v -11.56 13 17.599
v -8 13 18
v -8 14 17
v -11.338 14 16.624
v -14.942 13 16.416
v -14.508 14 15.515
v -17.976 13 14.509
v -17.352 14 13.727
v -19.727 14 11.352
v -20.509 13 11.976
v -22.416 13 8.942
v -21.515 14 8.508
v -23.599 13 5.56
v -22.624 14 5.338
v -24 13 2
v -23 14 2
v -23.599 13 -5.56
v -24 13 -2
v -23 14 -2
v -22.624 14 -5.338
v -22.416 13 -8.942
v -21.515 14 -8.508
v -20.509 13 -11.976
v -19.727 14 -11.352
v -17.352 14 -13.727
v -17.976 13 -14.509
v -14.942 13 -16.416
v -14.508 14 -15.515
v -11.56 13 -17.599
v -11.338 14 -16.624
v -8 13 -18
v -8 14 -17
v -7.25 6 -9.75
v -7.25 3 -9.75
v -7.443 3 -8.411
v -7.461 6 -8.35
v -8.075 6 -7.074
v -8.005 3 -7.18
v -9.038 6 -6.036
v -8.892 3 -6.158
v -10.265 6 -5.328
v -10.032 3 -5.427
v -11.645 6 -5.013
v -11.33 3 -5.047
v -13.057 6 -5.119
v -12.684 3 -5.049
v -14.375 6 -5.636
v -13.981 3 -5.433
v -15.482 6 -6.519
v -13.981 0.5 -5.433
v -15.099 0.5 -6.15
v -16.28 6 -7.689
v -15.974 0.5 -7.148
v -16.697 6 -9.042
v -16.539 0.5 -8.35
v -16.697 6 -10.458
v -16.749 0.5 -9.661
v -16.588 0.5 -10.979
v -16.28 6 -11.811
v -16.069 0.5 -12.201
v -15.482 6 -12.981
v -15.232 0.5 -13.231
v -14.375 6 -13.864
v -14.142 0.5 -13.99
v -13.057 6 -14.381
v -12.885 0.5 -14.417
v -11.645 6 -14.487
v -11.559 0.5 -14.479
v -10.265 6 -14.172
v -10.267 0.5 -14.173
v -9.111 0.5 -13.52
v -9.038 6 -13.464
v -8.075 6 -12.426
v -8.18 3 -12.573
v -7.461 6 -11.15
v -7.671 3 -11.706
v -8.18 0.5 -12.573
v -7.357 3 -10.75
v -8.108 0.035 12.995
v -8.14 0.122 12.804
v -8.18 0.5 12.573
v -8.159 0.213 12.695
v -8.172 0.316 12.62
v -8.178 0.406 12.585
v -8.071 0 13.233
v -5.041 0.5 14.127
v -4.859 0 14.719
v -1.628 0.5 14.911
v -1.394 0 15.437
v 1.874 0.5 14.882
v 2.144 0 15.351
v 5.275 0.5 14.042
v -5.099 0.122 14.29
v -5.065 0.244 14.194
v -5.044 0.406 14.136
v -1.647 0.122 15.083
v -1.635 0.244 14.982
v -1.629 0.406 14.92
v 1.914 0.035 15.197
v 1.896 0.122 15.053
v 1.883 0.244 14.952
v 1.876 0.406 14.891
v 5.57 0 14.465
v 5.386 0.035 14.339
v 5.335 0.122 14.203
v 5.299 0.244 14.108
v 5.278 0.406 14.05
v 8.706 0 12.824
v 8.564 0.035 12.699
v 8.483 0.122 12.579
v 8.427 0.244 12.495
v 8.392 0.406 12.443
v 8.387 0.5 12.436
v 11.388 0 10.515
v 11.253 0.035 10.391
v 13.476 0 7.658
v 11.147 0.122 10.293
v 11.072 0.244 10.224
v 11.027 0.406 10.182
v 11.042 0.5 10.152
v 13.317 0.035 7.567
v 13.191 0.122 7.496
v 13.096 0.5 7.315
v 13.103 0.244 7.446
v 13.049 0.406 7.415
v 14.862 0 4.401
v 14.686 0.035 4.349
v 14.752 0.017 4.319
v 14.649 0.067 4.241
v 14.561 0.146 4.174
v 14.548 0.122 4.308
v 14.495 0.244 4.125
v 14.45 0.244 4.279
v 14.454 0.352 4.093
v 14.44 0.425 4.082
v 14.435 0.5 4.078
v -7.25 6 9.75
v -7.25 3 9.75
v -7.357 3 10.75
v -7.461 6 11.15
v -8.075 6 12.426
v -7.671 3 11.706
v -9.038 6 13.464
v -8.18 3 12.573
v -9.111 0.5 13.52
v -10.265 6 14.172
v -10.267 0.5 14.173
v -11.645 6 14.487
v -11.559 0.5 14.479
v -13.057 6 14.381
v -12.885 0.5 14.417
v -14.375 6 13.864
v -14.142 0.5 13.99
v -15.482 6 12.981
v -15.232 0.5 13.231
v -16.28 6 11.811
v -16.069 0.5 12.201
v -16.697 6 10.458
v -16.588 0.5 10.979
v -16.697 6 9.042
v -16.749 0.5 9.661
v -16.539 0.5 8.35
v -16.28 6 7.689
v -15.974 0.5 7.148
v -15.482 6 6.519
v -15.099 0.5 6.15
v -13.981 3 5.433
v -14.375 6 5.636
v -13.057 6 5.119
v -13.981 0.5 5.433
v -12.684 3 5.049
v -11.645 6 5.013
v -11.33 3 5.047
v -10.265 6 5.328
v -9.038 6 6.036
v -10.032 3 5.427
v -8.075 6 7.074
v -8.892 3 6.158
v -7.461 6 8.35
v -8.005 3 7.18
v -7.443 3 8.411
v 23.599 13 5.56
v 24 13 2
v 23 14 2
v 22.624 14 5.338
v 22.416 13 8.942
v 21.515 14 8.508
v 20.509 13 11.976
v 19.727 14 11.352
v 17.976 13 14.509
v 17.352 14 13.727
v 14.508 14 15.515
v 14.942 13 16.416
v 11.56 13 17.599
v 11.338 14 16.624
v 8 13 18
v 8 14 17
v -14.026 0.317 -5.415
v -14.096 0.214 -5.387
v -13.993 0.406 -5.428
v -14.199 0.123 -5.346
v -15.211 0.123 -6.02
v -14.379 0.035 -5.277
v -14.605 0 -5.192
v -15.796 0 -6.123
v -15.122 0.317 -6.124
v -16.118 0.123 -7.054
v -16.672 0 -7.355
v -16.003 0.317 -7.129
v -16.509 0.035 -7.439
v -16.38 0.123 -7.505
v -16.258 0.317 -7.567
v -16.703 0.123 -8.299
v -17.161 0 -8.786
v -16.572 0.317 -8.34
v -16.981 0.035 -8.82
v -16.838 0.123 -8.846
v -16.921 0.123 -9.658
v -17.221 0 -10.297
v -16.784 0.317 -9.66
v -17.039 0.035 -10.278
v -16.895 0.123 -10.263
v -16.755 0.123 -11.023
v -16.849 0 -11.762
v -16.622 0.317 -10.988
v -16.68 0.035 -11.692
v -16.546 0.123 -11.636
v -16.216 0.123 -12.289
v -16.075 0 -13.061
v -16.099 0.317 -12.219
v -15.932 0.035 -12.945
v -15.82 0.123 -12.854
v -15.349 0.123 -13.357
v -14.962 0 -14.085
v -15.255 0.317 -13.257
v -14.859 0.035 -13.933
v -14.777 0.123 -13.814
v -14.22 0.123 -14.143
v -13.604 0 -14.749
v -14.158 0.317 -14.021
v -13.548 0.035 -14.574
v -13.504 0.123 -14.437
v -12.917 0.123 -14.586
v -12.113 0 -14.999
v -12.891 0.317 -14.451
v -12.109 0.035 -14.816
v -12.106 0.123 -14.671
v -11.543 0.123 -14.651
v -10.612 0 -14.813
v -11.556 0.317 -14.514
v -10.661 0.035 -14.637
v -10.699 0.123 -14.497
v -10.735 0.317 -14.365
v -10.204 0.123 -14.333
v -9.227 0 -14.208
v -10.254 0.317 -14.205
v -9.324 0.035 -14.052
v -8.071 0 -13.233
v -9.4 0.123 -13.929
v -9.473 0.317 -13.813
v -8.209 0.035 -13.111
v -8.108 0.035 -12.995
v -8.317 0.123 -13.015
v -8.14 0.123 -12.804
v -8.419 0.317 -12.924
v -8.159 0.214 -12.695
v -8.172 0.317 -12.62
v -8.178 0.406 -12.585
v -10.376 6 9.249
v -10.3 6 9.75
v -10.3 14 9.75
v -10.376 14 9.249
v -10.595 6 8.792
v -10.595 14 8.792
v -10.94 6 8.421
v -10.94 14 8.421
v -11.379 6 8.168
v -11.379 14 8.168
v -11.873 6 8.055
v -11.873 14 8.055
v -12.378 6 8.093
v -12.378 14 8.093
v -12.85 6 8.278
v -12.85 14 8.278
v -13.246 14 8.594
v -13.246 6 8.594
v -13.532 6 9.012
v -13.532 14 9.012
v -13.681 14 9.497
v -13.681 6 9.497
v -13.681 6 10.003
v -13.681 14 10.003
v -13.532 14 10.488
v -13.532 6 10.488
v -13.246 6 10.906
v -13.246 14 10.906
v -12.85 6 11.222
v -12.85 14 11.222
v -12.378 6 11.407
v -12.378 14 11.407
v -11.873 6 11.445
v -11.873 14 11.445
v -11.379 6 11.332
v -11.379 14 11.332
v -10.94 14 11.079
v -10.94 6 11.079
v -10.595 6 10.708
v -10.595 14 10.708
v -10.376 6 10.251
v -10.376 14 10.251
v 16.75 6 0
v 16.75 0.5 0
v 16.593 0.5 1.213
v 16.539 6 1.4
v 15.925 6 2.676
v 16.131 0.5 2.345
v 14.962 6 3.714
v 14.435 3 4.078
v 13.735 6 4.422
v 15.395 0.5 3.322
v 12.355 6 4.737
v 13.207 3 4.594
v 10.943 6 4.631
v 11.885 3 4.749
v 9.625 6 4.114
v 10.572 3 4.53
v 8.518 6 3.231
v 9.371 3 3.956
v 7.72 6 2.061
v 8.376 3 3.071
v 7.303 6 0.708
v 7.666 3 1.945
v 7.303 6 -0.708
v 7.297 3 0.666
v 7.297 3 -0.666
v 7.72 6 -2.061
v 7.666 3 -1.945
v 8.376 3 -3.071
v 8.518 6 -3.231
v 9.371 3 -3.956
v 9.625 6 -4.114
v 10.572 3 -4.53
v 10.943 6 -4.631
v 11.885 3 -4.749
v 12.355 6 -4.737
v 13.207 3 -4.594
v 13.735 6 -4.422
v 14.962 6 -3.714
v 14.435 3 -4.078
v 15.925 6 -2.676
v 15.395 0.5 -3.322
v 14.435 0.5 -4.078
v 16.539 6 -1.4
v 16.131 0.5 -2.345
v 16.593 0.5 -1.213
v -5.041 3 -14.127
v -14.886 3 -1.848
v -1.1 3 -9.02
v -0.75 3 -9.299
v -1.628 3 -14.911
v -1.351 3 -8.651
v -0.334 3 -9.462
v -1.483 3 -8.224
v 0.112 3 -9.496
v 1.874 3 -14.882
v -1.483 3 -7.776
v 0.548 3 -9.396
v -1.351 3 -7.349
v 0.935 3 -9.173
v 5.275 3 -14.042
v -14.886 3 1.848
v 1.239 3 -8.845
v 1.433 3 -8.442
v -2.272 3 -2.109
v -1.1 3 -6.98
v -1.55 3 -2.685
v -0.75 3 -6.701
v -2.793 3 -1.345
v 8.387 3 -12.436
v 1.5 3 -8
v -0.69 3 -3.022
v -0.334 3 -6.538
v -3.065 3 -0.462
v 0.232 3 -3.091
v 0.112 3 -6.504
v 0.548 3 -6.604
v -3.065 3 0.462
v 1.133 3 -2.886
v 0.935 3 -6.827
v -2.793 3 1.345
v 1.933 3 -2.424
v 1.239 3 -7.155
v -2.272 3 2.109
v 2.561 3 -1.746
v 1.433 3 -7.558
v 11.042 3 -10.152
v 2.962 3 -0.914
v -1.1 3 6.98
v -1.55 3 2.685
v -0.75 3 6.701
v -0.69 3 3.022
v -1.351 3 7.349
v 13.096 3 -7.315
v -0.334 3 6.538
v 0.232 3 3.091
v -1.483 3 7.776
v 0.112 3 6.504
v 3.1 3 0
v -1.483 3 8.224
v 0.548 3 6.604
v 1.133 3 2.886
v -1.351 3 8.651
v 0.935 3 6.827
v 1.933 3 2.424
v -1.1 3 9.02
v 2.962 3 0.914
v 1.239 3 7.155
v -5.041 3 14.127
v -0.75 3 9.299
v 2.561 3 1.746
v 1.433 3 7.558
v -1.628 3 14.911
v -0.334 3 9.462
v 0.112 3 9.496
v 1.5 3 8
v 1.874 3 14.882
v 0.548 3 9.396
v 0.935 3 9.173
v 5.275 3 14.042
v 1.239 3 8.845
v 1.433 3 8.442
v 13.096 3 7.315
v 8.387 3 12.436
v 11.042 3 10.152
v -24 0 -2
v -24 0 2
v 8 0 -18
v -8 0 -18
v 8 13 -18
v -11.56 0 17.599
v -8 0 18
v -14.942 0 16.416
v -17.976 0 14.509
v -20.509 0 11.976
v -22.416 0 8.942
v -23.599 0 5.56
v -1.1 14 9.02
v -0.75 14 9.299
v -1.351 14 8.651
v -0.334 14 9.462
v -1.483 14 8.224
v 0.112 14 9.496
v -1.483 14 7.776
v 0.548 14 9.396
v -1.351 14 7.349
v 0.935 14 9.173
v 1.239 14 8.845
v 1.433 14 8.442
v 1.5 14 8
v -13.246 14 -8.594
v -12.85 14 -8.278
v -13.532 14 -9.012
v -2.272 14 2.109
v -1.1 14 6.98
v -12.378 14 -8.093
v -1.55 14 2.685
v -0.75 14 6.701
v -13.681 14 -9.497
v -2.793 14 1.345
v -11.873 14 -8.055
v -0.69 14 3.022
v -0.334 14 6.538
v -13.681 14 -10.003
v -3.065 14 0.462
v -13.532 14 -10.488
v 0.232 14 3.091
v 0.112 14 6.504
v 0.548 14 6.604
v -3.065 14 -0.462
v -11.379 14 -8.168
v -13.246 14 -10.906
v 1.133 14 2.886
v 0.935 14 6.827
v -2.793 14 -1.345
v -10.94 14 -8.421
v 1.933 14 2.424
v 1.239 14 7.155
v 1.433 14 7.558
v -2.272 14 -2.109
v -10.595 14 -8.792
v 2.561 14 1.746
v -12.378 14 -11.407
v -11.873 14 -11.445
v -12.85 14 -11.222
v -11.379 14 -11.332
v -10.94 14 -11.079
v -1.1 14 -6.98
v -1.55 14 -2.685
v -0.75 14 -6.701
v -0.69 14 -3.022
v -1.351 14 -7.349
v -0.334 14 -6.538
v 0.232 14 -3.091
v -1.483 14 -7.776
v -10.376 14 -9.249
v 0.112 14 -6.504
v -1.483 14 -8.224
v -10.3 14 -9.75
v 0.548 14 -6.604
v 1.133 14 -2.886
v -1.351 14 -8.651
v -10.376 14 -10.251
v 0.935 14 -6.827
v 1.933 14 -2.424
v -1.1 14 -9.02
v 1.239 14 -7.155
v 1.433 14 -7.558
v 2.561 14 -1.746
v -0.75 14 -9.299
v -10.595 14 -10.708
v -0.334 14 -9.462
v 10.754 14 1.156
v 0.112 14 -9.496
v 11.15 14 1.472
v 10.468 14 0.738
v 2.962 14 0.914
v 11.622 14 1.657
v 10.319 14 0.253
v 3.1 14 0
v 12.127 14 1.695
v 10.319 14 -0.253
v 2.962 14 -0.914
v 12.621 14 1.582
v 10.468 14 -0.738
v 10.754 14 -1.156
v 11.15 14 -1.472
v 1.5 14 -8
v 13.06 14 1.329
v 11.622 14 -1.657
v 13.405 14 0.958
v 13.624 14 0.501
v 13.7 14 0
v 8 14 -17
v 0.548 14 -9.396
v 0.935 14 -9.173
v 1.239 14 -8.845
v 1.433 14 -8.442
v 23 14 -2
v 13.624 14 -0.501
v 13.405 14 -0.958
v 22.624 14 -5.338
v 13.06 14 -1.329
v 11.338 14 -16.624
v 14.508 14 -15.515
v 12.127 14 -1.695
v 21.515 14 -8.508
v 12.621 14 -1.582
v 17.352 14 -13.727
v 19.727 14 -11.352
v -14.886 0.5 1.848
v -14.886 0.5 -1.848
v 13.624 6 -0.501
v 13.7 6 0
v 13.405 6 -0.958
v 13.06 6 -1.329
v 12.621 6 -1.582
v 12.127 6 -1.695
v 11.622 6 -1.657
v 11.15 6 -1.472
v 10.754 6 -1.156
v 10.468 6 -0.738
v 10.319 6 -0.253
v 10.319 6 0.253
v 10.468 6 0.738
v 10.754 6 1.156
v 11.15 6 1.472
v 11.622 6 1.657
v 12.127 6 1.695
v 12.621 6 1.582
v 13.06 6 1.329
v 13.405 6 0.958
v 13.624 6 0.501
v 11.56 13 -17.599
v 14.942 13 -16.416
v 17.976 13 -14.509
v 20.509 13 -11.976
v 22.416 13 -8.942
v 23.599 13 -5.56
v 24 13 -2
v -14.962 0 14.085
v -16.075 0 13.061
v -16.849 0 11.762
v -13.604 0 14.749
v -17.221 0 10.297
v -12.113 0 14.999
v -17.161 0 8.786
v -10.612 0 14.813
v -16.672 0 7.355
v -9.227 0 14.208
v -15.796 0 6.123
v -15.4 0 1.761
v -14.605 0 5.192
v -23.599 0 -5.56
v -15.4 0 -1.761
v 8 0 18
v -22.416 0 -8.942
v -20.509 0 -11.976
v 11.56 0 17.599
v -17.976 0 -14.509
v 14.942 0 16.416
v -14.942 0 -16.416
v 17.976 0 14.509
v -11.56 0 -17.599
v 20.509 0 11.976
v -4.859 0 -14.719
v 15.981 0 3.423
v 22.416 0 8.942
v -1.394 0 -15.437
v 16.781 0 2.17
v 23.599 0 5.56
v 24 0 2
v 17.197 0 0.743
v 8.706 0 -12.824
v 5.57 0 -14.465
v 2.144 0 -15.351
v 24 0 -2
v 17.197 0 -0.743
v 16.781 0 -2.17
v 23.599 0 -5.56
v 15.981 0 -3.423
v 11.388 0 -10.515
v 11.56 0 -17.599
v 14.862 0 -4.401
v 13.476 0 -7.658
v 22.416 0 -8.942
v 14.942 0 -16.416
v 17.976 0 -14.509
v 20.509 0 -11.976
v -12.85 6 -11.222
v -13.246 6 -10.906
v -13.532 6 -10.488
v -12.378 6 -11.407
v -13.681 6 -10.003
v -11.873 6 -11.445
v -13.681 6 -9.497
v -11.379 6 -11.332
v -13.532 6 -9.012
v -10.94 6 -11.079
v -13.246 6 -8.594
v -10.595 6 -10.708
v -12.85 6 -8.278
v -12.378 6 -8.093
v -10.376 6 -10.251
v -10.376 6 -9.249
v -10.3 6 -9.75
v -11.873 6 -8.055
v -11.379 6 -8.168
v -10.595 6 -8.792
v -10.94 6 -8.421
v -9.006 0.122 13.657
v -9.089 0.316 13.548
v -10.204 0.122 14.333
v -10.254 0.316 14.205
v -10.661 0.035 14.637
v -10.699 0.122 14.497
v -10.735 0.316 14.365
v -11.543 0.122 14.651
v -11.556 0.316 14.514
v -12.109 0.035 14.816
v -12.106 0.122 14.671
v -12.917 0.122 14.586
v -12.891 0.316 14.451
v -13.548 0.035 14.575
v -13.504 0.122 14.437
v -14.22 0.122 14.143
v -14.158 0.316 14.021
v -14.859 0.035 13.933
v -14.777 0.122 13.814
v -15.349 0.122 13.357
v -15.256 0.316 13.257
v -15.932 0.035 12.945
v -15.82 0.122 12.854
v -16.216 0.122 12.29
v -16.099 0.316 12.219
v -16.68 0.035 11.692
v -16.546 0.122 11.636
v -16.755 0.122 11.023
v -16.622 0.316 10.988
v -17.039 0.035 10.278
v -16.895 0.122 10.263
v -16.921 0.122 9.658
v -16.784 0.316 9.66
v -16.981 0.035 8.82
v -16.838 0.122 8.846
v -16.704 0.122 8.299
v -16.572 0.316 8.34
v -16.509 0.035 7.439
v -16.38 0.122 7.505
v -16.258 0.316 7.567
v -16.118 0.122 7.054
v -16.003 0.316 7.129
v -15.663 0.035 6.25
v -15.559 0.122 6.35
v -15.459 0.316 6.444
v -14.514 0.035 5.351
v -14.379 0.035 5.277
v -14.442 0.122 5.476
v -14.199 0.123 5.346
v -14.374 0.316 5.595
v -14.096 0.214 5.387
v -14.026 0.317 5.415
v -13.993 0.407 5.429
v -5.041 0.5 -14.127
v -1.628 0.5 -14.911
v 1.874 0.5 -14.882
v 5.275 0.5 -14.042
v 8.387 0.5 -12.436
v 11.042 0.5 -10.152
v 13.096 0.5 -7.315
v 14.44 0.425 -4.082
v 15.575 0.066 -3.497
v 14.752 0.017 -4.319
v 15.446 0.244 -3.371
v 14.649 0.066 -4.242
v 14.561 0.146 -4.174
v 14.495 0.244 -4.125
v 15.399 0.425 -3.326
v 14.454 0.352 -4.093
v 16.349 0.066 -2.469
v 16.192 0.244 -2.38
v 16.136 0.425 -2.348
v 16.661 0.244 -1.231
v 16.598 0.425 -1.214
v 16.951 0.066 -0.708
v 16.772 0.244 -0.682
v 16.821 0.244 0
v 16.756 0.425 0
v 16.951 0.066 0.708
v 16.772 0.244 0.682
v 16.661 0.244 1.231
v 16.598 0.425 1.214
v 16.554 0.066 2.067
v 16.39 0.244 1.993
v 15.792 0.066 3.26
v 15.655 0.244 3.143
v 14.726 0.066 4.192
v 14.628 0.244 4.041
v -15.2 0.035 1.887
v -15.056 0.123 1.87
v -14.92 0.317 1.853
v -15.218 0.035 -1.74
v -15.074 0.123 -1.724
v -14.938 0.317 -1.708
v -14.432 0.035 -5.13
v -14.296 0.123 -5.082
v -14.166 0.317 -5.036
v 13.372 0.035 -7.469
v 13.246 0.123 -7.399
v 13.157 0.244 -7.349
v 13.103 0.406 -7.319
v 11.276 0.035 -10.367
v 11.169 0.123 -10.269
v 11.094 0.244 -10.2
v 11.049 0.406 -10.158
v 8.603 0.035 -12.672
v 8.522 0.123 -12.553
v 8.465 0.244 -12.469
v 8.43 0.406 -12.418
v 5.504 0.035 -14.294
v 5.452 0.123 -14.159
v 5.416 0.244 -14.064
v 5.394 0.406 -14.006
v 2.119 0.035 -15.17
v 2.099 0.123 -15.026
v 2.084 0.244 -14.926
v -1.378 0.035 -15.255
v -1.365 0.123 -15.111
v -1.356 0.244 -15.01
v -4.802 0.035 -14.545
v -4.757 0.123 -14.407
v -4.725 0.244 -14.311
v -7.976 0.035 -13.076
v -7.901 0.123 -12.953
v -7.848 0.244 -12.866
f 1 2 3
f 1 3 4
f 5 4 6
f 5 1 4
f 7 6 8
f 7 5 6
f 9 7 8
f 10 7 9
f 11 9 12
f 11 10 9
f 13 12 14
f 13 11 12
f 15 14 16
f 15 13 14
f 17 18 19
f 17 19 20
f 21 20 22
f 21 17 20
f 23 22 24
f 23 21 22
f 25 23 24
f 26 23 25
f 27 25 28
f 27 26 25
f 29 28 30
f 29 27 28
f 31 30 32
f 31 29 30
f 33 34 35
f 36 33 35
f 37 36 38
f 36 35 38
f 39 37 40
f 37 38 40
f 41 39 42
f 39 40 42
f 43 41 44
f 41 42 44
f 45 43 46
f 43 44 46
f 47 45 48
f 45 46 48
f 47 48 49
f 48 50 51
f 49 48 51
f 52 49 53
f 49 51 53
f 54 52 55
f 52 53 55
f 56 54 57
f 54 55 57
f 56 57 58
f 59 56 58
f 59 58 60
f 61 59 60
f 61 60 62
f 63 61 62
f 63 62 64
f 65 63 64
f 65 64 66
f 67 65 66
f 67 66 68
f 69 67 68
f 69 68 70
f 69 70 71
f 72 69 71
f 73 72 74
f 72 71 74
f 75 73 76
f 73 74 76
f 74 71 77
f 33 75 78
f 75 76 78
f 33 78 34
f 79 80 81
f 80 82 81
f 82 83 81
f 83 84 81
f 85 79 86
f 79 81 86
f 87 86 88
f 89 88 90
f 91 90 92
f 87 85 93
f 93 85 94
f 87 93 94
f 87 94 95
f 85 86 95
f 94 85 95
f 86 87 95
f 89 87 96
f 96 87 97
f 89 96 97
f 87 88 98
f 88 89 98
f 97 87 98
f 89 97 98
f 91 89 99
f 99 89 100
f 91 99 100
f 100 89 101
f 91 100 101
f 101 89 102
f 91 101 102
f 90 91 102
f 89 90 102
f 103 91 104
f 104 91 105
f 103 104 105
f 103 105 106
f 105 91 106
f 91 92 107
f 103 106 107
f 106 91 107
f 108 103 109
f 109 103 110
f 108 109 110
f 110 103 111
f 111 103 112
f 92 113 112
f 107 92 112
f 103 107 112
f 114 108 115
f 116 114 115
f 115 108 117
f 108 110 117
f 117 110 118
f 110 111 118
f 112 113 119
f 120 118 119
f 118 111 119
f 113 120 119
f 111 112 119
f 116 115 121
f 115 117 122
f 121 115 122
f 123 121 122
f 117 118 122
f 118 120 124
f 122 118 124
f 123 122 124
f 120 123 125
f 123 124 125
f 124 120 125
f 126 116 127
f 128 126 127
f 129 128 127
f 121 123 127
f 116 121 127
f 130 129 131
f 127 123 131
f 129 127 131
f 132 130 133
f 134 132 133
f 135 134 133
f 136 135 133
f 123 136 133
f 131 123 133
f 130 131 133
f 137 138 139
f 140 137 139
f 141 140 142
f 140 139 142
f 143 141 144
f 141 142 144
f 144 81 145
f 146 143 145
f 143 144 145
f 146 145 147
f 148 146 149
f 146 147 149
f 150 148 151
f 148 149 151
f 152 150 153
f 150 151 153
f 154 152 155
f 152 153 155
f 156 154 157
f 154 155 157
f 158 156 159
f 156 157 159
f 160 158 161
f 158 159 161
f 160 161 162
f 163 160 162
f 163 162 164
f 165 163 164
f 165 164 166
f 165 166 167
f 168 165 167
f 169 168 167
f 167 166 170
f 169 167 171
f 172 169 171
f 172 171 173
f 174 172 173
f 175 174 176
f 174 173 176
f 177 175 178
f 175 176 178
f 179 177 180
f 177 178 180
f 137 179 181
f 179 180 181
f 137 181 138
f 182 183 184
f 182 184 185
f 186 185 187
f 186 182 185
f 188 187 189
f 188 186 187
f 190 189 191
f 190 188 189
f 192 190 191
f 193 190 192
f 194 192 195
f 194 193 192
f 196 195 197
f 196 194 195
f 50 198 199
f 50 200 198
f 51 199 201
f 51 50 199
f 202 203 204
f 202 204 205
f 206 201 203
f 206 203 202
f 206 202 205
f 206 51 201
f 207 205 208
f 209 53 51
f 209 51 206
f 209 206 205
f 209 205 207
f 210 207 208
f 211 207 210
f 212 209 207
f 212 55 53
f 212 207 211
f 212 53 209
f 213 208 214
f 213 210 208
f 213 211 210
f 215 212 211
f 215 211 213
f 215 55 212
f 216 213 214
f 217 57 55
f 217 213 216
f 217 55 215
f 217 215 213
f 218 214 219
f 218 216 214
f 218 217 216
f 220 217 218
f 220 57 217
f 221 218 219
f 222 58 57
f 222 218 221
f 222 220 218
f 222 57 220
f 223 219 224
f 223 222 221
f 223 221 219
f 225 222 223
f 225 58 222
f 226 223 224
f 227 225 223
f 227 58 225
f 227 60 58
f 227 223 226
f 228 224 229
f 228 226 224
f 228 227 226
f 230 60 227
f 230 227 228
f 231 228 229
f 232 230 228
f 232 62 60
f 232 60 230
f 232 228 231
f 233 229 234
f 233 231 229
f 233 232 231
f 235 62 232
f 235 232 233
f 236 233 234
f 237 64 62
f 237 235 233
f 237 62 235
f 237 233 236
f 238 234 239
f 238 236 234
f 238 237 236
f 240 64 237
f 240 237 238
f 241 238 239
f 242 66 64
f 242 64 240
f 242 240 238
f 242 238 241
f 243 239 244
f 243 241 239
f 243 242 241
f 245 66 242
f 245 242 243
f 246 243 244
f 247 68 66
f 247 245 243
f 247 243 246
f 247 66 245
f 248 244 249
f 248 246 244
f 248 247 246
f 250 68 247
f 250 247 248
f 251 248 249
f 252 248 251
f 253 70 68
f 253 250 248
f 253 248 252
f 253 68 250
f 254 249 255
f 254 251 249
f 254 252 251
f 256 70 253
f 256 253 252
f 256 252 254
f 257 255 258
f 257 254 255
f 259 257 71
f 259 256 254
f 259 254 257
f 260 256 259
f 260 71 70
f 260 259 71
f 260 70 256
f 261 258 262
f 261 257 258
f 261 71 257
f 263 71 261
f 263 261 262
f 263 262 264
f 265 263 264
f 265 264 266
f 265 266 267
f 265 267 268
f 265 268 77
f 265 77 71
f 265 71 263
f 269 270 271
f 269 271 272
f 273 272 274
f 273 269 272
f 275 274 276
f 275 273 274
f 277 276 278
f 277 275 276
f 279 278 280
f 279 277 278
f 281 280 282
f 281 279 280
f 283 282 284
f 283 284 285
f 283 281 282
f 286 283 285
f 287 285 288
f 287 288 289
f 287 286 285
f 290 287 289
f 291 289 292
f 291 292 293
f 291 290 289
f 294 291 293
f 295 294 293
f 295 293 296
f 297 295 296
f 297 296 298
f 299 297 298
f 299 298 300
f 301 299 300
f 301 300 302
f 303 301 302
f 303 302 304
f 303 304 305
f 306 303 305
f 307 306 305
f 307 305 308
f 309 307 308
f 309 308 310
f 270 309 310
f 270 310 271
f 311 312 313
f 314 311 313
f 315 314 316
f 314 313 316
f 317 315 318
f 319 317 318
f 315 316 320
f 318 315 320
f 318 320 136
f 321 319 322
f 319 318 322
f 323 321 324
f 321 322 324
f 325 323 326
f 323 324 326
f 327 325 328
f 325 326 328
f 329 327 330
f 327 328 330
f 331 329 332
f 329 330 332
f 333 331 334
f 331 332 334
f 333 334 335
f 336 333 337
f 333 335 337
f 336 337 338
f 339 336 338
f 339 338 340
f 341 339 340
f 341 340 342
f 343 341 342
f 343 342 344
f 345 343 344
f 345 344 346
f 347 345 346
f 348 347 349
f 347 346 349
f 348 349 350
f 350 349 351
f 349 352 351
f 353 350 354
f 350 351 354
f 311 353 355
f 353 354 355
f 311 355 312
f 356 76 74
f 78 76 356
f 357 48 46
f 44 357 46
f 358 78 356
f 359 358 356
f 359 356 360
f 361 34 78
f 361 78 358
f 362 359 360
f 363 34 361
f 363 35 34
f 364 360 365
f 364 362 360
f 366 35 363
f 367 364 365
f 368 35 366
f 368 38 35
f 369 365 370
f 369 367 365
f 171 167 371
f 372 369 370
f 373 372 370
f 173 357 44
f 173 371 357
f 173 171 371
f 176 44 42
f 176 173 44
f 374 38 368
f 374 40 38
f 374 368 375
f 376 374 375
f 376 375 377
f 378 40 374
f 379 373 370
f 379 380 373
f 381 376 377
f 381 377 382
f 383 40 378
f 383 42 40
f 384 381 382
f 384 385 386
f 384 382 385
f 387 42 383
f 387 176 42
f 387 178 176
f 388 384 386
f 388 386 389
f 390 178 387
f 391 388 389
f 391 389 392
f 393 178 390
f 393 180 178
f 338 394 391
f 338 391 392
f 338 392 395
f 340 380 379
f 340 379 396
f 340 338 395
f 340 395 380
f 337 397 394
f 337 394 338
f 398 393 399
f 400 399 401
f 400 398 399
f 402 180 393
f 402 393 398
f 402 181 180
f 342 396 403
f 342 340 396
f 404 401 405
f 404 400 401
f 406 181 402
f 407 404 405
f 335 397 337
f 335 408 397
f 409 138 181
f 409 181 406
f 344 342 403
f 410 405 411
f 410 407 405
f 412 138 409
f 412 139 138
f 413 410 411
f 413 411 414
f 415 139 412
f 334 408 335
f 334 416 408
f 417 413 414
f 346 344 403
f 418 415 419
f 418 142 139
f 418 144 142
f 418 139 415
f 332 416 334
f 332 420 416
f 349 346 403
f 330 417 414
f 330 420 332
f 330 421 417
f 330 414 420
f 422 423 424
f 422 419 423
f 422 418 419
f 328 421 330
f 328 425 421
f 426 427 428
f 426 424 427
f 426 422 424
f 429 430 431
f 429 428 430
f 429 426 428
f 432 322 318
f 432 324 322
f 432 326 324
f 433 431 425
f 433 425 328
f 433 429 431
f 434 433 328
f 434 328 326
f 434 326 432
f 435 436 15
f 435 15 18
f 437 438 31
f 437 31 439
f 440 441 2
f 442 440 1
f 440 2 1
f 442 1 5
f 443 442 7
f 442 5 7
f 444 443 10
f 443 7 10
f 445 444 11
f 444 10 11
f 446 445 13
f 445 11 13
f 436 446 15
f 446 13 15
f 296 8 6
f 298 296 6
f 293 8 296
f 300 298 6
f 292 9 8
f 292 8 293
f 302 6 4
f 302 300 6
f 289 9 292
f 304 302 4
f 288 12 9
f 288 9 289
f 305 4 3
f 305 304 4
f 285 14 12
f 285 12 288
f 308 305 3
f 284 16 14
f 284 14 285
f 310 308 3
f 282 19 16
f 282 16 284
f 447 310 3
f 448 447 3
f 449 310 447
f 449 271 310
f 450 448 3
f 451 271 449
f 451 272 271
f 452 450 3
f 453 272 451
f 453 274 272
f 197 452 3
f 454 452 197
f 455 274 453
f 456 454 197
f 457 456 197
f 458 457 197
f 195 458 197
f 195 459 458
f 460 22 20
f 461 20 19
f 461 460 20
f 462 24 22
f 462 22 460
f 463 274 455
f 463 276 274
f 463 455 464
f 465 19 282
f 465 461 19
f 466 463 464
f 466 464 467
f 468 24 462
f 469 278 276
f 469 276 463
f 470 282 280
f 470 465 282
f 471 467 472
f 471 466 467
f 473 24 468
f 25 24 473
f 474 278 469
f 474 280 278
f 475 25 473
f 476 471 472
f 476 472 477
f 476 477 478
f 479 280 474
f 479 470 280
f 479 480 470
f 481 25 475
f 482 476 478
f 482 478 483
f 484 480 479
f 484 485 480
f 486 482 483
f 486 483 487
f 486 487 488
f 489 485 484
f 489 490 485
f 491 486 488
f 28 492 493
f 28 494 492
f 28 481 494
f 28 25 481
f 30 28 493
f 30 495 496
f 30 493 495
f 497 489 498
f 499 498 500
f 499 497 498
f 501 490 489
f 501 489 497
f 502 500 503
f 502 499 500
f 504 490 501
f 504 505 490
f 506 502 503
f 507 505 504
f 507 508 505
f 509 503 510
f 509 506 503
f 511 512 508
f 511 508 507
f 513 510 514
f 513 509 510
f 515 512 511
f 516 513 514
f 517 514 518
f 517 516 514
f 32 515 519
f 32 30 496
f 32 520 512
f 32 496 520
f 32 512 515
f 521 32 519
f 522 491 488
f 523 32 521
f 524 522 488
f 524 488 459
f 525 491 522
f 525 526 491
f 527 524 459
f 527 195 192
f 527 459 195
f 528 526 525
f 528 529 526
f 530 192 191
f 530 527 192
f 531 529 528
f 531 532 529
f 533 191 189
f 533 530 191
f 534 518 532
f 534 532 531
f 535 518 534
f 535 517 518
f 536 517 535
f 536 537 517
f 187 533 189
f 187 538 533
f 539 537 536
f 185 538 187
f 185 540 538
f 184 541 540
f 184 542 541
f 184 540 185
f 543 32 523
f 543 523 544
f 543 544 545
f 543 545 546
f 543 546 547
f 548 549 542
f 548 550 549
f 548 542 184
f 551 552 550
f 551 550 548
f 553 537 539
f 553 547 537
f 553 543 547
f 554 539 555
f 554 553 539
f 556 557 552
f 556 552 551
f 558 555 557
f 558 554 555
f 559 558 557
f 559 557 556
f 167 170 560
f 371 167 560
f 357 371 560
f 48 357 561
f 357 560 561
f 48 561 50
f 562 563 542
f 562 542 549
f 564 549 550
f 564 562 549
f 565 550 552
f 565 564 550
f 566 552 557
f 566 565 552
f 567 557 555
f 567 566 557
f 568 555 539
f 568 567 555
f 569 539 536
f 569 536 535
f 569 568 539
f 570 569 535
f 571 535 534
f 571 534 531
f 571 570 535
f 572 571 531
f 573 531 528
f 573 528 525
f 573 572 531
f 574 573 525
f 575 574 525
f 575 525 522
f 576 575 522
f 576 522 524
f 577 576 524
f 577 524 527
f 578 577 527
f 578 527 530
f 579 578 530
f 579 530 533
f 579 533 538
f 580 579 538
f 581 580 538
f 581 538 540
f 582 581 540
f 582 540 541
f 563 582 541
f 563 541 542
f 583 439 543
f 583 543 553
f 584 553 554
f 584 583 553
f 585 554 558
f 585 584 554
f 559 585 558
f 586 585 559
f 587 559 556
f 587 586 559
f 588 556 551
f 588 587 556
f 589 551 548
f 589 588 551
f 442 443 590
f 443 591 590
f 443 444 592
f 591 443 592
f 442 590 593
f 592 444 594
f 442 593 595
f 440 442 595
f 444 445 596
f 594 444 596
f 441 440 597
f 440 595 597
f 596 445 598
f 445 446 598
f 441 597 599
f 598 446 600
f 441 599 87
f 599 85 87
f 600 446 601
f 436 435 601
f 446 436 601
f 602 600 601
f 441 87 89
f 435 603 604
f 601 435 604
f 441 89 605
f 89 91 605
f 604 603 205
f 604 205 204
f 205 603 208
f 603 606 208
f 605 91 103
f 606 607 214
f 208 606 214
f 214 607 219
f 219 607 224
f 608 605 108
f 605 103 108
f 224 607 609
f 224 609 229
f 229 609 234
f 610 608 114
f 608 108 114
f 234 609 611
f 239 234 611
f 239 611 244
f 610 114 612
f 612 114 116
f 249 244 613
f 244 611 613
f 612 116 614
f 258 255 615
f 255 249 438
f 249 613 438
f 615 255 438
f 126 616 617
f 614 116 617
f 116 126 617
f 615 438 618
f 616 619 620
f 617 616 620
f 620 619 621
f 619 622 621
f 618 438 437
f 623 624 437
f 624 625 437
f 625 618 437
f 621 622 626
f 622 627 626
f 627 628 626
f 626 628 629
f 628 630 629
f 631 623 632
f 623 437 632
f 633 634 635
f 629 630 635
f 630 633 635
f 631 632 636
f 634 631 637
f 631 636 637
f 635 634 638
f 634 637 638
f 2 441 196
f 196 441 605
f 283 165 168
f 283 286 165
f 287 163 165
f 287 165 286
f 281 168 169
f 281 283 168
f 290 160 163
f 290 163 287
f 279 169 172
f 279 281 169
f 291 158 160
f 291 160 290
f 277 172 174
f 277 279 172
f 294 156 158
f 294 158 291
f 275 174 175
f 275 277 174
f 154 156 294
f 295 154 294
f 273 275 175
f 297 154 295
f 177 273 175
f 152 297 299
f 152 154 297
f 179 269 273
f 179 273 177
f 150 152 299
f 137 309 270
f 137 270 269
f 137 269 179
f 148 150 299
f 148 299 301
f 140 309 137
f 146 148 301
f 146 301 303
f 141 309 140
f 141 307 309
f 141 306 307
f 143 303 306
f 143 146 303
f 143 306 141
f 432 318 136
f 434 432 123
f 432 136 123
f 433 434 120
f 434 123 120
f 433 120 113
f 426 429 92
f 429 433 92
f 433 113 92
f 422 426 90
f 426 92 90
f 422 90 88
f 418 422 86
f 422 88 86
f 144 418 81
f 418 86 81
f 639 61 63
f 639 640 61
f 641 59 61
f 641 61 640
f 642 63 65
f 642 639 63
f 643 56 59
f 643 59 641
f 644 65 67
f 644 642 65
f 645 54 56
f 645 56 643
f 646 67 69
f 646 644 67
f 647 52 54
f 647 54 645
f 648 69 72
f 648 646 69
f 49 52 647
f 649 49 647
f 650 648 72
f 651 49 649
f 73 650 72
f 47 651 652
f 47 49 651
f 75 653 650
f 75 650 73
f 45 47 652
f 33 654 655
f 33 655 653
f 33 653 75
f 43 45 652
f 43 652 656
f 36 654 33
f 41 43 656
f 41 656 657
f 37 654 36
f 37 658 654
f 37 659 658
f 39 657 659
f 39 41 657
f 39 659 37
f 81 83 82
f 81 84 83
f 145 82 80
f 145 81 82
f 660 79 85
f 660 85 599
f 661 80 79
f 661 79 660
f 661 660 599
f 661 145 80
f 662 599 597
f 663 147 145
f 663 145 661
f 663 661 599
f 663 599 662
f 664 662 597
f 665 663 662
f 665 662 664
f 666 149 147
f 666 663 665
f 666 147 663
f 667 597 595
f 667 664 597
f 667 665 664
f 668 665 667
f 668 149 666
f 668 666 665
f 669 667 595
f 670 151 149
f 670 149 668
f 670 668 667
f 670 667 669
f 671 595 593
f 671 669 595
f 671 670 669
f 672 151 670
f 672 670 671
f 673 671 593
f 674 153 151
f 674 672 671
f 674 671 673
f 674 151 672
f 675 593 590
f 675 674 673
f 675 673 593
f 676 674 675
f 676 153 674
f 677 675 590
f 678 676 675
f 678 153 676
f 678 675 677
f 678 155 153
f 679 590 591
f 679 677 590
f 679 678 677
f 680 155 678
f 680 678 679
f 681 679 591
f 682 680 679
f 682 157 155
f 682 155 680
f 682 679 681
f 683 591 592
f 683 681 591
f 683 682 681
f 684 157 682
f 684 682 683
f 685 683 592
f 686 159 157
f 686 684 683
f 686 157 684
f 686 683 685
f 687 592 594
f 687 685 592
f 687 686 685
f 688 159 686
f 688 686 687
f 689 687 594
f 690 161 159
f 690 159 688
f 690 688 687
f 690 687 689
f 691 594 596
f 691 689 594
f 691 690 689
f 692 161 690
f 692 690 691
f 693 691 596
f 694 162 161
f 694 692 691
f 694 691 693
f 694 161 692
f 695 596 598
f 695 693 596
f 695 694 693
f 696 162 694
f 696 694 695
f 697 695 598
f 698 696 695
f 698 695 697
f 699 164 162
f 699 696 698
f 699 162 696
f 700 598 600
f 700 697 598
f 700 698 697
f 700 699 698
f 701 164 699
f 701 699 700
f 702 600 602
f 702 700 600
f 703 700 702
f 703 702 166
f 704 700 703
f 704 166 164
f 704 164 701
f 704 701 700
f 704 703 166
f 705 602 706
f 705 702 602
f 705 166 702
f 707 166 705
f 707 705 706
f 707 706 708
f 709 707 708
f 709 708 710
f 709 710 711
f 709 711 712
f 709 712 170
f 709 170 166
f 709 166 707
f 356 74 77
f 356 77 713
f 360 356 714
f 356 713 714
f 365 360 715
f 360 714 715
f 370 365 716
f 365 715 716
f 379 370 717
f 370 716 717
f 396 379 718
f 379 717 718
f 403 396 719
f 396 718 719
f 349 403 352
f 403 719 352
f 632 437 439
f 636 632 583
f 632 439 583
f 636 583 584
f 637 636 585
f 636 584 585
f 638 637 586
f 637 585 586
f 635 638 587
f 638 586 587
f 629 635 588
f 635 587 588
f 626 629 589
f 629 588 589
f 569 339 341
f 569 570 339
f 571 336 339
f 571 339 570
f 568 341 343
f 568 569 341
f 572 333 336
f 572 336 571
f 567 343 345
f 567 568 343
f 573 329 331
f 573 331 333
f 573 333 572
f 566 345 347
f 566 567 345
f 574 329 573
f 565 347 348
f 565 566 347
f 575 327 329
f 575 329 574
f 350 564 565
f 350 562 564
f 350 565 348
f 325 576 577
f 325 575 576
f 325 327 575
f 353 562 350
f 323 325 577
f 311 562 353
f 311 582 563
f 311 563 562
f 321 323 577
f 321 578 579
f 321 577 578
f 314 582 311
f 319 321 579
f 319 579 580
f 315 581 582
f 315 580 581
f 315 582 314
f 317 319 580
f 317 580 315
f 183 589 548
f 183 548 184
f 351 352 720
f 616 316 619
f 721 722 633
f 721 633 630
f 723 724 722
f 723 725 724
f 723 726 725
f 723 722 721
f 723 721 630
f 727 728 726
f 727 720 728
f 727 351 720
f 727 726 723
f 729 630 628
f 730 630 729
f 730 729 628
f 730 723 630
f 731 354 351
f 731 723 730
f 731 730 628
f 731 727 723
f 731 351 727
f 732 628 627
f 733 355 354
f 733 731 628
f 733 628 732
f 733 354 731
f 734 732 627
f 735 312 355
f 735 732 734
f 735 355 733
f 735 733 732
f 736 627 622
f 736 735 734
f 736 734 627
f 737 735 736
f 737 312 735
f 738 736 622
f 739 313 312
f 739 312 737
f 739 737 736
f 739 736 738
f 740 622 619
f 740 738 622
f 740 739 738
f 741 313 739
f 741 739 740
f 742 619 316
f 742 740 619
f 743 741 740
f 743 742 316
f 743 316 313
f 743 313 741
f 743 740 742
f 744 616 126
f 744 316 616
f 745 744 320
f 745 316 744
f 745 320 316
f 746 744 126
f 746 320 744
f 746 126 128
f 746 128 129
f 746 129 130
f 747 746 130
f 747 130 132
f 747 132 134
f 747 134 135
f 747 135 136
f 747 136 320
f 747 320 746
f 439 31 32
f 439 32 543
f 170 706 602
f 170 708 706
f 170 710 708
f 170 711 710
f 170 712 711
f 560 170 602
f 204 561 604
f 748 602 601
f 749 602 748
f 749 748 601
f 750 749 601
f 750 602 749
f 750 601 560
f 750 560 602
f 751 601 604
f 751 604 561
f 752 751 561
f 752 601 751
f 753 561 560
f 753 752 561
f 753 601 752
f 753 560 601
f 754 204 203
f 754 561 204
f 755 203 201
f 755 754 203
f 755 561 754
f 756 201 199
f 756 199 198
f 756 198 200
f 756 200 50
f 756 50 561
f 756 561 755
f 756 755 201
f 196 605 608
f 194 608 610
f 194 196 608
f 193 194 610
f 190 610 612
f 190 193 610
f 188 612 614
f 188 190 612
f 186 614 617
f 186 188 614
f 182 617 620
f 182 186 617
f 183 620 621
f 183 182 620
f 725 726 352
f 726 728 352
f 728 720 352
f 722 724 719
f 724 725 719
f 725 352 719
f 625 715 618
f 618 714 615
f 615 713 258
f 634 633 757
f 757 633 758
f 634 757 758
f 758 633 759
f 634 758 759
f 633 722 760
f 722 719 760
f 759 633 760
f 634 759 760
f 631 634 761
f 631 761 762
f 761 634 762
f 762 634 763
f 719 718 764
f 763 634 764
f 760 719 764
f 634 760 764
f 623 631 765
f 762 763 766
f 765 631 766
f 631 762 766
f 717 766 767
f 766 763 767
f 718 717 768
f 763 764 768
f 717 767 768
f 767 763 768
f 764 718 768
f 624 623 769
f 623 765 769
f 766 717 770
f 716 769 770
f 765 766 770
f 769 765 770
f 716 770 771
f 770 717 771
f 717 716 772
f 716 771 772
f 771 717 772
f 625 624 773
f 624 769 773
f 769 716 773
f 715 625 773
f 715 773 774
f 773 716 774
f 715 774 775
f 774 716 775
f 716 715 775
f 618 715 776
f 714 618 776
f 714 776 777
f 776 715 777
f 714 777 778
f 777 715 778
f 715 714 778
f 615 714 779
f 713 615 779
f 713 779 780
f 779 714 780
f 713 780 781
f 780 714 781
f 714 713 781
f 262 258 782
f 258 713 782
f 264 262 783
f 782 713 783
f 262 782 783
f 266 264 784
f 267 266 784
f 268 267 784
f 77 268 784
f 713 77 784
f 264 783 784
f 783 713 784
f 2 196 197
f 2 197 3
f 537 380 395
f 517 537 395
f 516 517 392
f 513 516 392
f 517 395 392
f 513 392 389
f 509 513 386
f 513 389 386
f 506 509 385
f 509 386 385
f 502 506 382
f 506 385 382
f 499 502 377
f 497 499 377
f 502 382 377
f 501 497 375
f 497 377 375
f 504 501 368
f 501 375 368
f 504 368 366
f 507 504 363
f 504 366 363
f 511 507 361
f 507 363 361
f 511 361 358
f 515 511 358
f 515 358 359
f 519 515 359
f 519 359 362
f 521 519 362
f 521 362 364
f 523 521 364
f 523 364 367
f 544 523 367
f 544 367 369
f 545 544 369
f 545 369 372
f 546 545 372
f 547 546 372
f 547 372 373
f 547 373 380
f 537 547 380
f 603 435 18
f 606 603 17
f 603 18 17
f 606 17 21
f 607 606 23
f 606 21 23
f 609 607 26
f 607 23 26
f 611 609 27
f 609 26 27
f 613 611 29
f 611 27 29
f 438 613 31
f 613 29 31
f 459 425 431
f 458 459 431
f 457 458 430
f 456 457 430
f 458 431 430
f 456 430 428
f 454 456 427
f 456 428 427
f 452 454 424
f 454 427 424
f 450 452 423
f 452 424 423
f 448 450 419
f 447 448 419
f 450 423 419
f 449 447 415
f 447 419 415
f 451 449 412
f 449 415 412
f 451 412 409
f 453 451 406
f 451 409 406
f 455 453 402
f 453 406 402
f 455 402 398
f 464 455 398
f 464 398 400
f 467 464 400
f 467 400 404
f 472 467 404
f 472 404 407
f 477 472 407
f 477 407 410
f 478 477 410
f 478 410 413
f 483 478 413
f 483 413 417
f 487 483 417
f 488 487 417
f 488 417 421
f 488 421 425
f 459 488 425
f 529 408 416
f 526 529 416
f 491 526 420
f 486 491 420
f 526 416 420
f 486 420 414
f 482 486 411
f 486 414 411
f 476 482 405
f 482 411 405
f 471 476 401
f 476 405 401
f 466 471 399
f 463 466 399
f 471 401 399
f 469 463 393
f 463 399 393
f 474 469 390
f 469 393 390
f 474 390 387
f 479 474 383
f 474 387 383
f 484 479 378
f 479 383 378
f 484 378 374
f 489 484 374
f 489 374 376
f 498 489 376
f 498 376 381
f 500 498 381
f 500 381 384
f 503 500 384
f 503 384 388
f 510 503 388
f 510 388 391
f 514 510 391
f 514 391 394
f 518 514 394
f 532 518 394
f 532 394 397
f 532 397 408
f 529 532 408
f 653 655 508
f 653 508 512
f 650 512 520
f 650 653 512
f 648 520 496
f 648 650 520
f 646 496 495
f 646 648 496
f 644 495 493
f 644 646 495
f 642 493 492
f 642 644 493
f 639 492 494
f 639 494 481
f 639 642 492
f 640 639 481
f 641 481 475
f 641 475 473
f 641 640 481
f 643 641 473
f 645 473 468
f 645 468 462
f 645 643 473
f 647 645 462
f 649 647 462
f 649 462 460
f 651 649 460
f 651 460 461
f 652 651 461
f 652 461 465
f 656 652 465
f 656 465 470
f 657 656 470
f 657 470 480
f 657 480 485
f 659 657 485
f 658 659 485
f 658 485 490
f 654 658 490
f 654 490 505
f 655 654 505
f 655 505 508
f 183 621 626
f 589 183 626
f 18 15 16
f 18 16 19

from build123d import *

# Parameters (mm, degrees)
SKETCH1_W           = 48
SKETCH1_H           = 36
SKETCH1_R           = 1.7
BOSS_EXTRUDE1_DEPTH = 14
SKETCH2_R           = 1.5
SKETCH2_R_2         = 3.1
CUT_EXTRUDE3_DEPTH  = 15
SKETCH5_R           = 15
CUT_EXTRUDE4_DEPTH  = 3
SKETCH7_R           = 4.75
CUT_EXTRUDE5_DEPTH  = 6
FILLET1_R           = 16
FILLET2_R           = 16
FILLET3_R           = 0.5
CHAMFER2_SIZE       = 1


with BuildPart() as part:
    # Sketch1 → Boss-Extrude1 (new body)
    with BuildSketch(Plane(origin=(0, 0, 0), x_dir=(1, 0, 0), z_dir=(0, 1, 0))):
        Rectangle(SKETCH1_W, SKETCH1_H)
        with Locations((-12, 9.75)):
            Circle(SKETCH1_R, mode=Mode.SUBTRACT)
        with Locations((-12, -9.75)):
            Circle(SKETCH1_R, mode=Mode.SUBTRACT)
        with Locations((12, 0)):
            Circle(SKETCH1_R, mode=Mode.SUBTRACT)
    extrude(amount=BOSS_EXTRUDE1_DEPTH)

    # Sketch2 → Cut-Extrude3 (cut, through all)
    with BuildSketch(Plane.XZ):
        with Locations((0, 8)):
            Circle(SKETCH2_R)
        with Locations((0, -8)):
            Circle(SKETCH2_R)
        Circle(SKETCH2_R_2)
    extrude(amount=-CUT_EXTRUDE3_DEPTH, mode=Mode.SUBTRACT)

    # Sketch5 → Cut-Extrude4 (cut)
    with BuildSketch(Plane.XZ):
        Circle(SKETCH5_R)
    extrude(amount=-CUT_EXTRUDE4_DEPTH, mode=Mode.SUBTRACT)

    # Sketch7 → Cut-Extrude5 (cut)
    with BuildSketch(Plane.XZ):
        with Locations((12, 0)):
            Circle(SKETCH7_R)
        with Locations((-12, 9.75)):
            Circle(SKETCH7_R)
        with Locations((-12, -9.75)):
            Circle(SKETCH7_R)
    extrude(amount=-CUT_EXTRUDE5_DEPTH, mode=Mode.SUBTRACT)

    # Fillet1
    fillet1_edges = [part.edges().sort_by_distance(p)[0] for p in [
        (24, 7, 18),
        (24, 7, -18),
    ]]
    fillet(fillet1_edges, radius=FILLET1_R)

    # Fillet2
    fillet2_edges = [part.edges().sort_by_distance(p)[0] for p in [
        (-24, 7, 18),
        (-24, 7, -18),
    ]]
    fillet(fillet2_edges, radius=FILLET2_R)

    # Fillet3
    fillet3_edges = [part.edges().sort_by_distance(p)[0] for p in [
        (5.27456542, 0, -14.042042573),
        (5.27456542, 0, 14.042042573),
        (-15, 0, 0),
        (16.13087492, 0, 2.344860848),
        (-15.686541501, 0, 12.745314969),
        (-15.686541501, 0, -12.745314969),
    ]]
    fillet(fillet3_edges, radius=FILLET3_R)

    # Chamfer2
    chamfer2_edges = [part.edges().sort_by_distance(p)[0] for p in [
        (0, 14, -18),
        (19.313708499, 14, -13.313708499),
        (19.313708499, 14, 13.313708499),
        (0, 14, 18),
        (-24, 14, 0),
        (-19.313708499, 14, -13.313708499),
        (-19.313708499, 14, 13.313708499),
        (24, 14, 0),
    ]]
    chamfer(chamfer2_edges, length=CHAMFER2_SIZE)


solid = part.part
